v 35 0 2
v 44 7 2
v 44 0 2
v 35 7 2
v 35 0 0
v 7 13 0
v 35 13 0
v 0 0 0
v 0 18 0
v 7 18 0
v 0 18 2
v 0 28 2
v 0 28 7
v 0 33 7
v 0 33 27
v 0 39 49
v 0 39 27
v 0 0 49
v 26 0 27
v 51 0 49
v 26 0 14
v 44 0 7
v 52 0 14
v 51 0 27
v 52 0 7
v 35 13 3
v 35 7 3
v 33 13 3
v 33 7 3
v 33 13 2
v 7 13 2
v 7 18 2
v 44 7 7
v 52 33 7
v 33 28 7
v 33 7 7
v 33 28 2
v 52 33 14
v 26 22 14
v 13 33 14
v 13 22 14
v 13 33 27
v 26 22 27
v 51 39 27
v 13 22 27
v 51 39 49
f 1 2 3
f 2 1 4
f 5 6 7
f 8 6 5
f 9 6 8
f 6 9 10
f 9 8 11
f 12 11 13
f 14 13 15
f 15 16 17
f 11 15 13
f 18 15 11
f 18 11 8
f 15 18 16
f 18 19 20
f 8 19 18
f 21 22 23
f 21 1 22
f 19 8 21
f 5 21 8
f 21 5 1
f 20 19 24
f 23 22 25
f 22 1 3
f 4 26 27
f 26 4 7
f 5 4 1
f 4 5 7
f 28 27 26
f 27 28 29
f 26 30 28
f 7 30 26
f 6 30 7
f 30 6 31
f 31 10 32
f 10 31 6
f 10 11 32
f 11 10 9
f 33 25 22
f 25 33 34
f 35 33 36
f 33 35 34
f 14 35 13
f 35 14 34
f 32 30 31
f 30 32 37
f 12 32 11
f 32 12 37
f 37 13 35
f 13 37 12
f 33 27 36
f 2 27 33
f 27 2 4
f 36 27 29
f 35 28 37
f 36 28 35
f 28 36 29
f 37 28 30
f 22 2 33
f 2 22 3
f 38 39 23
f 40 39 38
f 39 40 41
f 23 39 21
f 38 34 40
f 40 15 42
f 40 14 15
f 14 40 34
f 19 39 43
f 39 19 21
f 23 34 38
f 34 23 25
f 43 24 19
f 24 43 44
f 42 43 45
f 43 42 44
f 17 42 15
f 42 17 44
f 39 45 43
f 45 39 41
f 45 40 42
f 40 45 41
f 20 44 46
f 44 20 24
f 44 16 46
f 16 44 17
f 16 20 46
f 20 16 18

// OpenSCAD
translate([2.5, 1.5, 1.0]) color([0.699601591737329, 0.07964741684534404, 0.23738047361475634]) cube([5, 3, 2], center=true);
translate([7.5, 1.5, 1.0]) color([0.8282556520451495, 0.1762738246231843, 0.9459581227747745]) cube([5, 3, 2], center=true);
translate([12.5, 1.5, 1.0]) color([0.9565644324307663, 0.8963269305888116, 0.7428117304122551]) cube([5, 3, 2], center=true);
translate([17.5, 1.5, 1.0]) color([0.8383436924491765, 0.5614087817692366, 0.7177928021437573]) cube([5, 3, 2], center=true);
translate([22.5, 1.5, 1.0]) color([0.4271772721979724, 0.8646648421725511, 0.10365846470378459]) cube([5, 3, 2], center=true);
translate([27.5, 1.5, 1.0]) color([0.6285317276232824, 0.7101075213407797, 0.6149371087697887]) cube([5, 3, 2], center=true);
translate([32.5, 1.5, 1.0]) color([0.0400488022899097, 0.34025031183581533, 0.7380159626358669]) cube([5, 3, 2], center=true);
translate([3.5, 5.5, 1.5]) color([0.3765176313166855, 0.6257641682954356, 0.8894786539399329]) cube([7, 5, 3], center=true);
translate([10.5, 5.5, 1.5]) color([0.4963449395419606, 0.3583651728386771, 0.6716454412848432]) cube([7, 5, 3], center=true);
translate([17.5, 5.5, 1.5]) color([0.45811681625355094, 0.5074379917667022, 0.16228475224599026]) cube([7, 5, 3], center=true);
translate([24.5, 5.5, 1.5]) color([0.7529781863444399, 0.3376457636791449, 0.8033239356600728]) cube([7, 5, 3], center=true);
translate([31.5, 5.5, 1.5]) color([0.9444207727357242, 0.014783921172948133, 0.5303420268039528]) cube([7, 5, 3], center=true);
translate([3.5, 10.5, 1.5]) color([0.2882277186993394, 0.4689175335863792, 0.03492832759702502]) cube([7, 5, 3], center=true);
translate([10.5, 10.5, 1.5]) color([0.5317931441254861, 0.552095437515129, 0.9340898594770107]) cube([7, 5, 3], center=true);
translate([17.5, 10.5, 1.5]) color([0.03830085289416996, 0.3950652682884612, 0.1200155720396251]) cube([7, 5, 3], center=true);
translate([24.5, 10.5, 1.5]) color([0.34658884626630715, 0.051152415727703016, 0.2730496953424699]) cube([7, 5, 3], center=true);
translate([31.5, 10.5, 1.5]) color([0.9956802504828091, 0.25391998649183944, 0.6803935586065328]) cube([7, 5, 3], center=true);
translate([3.5, 15.5, 1.5]) color([0.7027090324157298, 0.9291230685247301, 0.9949404722907454]) cube([7, 5, 3], center=true);
translate([5.5, 3.5, 4.5]) color([0.7620813713006523, 0.7625973189567923, 0.5162610213479427]) cube([11, 7, 5], center=true);
translate([5.5, 10.5, 4.5]) color([0.3860717563215982, 0.8343975914408754, 0.2506337702942619]) cube([11, 7, 5], center=true);
translate([5.5, 17.5, 4.5]) color([0.11599539642064438, 0.9817240858781537, 0.8047994372884794]) cube([11, 7, 5], center=true);
translate([5.5, 24.5, 4.5]) color([0.9431012043694105, 0.24264659424234813, 0.6738638931519124]) cube([11, 7, 5], center=true);
translate([16.5, 3.5, 4.5]) color([0.5327800265053269, 0.8756440829735669, 0.16255101499230828]) cube([11, 7, 5], center=true);
translate([16.5, 10.5, 4.5]) color([0.8680483691353614, 0.15305579700066485, 0.8462165202751376]) cube([11, 7, 5], center=true);
translate([16.5, 17.5, 4.5]) color([0.8200801239095041, 0.5849326984313064, 0.05125489506773162]) cube([11, 7, 5], center=true);
translate([16.5, 24.5, 4.5]) color([0.156166769208809, 0.34458118202681143, 0.291190613997825]) cube([11, 7, 5], center=true);
translate([27.5, 3.5, 4.5]) color([0.29342424365134856, 0.49485912757206985, 0.40365829021262367]) cube([11, 7, 5], center=true);
translate([27.5, 10.5, 4.5]) color([0.43100562682353716, 0.17003546655932655, 0.788340085303476]) cube([11, 7, 5], center=true);
translate([27.5, 17.5, 4.5]) color([0.5686027559906347, 0.44188886974638586, 0.3413461590512491]) cube([11, 7, 5], center=true);
translate([27.5, 24.5, 4.5]) color([0.009317740415098474, 0.72162474304745, 0.9099060293040379]) cube([11, 7, 5], center=true);
translate([38.5, 3.5, 4.5]) color([0.6642090292154819, 0.6628365798191557, 0.2575988974219705]) cube([11, 7, 5], center=true);
translate([6.5, 5.5, 10.5]) color([0.6122127561841502, 0.07024606726227145, 0.936077955543095]) cube([13, 11, 7], center=true);
translate([6.5, 16.5, 10.5]) color([0.27870721332570936, 0.8301443917589898, 0.5295296249528143]) cube([13, 11, 7], center=true);
translate([6.5, 27.5, 10.5]) color([0.06328696503387199, 0.639390097241117, 0.579686955437464]) cube([13, 11, 7], center=true);
translate([19.5, 5.5, 10.5]) color([0.9416538141960143, 0.6321291610349786, 0.5434228748459046]) cube([13, 11, 7], center=true);
translate([19.5, 16.5, 10.5]) color([0.38469874676133664, 0.434637548519362, 0.31139777068021024]) cube([13, 11, 7], center=true);
translate([19.5, 27.5, 10.5]) color([0.01363511702942577, 0.7785312160167684, 0.8197509625398982]) cube([13, 11, 7], center=true);
translate([32.5, 5.5, 10.5]) color([0.28044077713976767, 0.2581907625337724, 0.5272652548146236]) cube([13, 11, 7], center=true);
translate([32.5, 16.5, 10.5]) color([0.3179301097250754, 0.3422638341038545, 0.7055726929201963]) cube([13, 11, 7], center=true);
translate([32.5, 27.5, 10.5]) color([0.43169639849300545, 0.14170724037842175, 0.0059275683019511805]) cube([13, 11, 7], center=true);
translate([45.5, 5.5, 10.5]) color([0.5113413643489257, 0.7846494738841625, 0.7013909140505133]) cube([13, 11, 7], center=true);
translate([45.5, 16.5, 10.5]) color([0.7815279332048084, 0.38414456219182536, 0.4641305725985776]) cube([13, 11, 7], center=true);
translate([45.5, 27.5, 10.5]) color([0.036369164001931575, 0.9124290899309246, 0.6366653413633517]) cube([13, 11, 7], center=true);
translate([6.5, 5.5, 20.5]) color([0.798477007479407, 0.7602358551941967, 0.899814300356001]) cube([13, 11, 13], center=true);
translate([6.5, 16.5, 20.5]) color([0.3622224295816935, 0.9815510059994267, 0.15851660579635174]) cube([13, 11, 13], center=true);
translate([6.5, 27.5, 20.5]) color([0.19450942151924966, 0.35447317829590397, 0.700089123077614]) cube([13, 11, 13], center=true);
translate([19.5, 5.5, 20.5]) color([0.019141470871264166, 0.7352582011311831, 0.5715587801616956]) cube([13, 11, 13], center=true);
translate([19.5, 16.5, 20.5]) color([0.24207966979200135, 0.18514161515939986, 0.7580746928341441]) cube([13, 11, 13], center=true);
translate([8.5, 6.5, 32.5]) color([0.4199819570625165, 0.5731405723704375, 0.23673356878784502]) cube([17, 13, 11], center=true);
translate([8.5, 19.5, 32.5]) color([0.7138158488992904, 0.8637627475626694, 0.8949592620642776]) cube([17, 13, 11], center=true);
translate([25.5, 6.5, 32.5]) color([0.8103115760161889, 0.1004216369837837, 0.18827941391234093]) cube([17, 13, 11], center=true);
translate([25.5, 19.5, 32.5]) color([0.44049583318501173, 0.06522983258952386, 0.42674703623912436]) cube([17, 13, 11], center=true);
translate([42.5, 6.5, 32.5]) color([0.3947422574489625, 0.27185274848852736, 0.43721657158275895]) cube([17, 13, 11], center=true);
translate([42.5, 19.5, 32.5]) color([0.7577296702077931, 0.3561631337530091, 0.3277620307403001]) cube([17, 13, 11], center=true);
translate([8.5, 32.5, 32.5]) color([0.30701912216942273, 0.492518074892234, 0.7625268269371841]) cube([17, 13, 11], center=true);
translate([25.5, 32.5, 32.5]) color([0.2027877178963453, 0.39789846082497404, 0.4356119392473006]) cube([17, 13, 11], center=true);
translate([42.5, 32.5, 32.5]) color([0.6353731723550147, 0.673076446274384, 0.6970991483341651]) cube([17, 13, 11], center=true);
translate([8.5, 6.5, 43.5]) color([0.8225488218547198, 0.5826892216899469, 0.3545830833155835]) cube([17, 13, 11], center=true);
translate([8.5, 19.5, 43.5]) color([0.5687886411459258, 0.564415288794693, 0.2783497745403337]) cube([17, 13, 11], center=true);
translate([25.5, 6.5, 43.5]) color([0.8220051901362931, 0.39809270556066123, 0.9209203386432881]) cube([17, 13, 11], center=true);
translate([25.5, 19.5, 43.5]) color([0.13533998311747797, 0.08148203466772541, 0.8649487446802395]) cube([17, 13, 11], center=true);
translate([42.5, 6.5, 43.5]) color([0.36102136972914045, 0.06937329613248533, 0.7172877126247486]) cube([17, 13, 11], center=true);
translate([42.5, 19.5, 43.5]) color([0.671396341477498, 0.47110224547326685, 0.3145322421799046]) cube([17, 13, 11], center=true);
translate([8.5, 32.5, 43.5]) color([0.8413649413366762, 0.9545082818366412, 0.02538948740661906]) cube([17, 13, 11], center=true);
translate([25.5, 32.5, 43.5]) color([0.39264862168779513, 0.12527064222330164, 0.9928151500577586]) cube([17, 13, 11], center=true);
translate([42.5, 32.5, 43.5]) color([0.6355716010561779, 0.40641678624517696, 0.1421319514189895]) cube([17, 13, 11], center=true);
